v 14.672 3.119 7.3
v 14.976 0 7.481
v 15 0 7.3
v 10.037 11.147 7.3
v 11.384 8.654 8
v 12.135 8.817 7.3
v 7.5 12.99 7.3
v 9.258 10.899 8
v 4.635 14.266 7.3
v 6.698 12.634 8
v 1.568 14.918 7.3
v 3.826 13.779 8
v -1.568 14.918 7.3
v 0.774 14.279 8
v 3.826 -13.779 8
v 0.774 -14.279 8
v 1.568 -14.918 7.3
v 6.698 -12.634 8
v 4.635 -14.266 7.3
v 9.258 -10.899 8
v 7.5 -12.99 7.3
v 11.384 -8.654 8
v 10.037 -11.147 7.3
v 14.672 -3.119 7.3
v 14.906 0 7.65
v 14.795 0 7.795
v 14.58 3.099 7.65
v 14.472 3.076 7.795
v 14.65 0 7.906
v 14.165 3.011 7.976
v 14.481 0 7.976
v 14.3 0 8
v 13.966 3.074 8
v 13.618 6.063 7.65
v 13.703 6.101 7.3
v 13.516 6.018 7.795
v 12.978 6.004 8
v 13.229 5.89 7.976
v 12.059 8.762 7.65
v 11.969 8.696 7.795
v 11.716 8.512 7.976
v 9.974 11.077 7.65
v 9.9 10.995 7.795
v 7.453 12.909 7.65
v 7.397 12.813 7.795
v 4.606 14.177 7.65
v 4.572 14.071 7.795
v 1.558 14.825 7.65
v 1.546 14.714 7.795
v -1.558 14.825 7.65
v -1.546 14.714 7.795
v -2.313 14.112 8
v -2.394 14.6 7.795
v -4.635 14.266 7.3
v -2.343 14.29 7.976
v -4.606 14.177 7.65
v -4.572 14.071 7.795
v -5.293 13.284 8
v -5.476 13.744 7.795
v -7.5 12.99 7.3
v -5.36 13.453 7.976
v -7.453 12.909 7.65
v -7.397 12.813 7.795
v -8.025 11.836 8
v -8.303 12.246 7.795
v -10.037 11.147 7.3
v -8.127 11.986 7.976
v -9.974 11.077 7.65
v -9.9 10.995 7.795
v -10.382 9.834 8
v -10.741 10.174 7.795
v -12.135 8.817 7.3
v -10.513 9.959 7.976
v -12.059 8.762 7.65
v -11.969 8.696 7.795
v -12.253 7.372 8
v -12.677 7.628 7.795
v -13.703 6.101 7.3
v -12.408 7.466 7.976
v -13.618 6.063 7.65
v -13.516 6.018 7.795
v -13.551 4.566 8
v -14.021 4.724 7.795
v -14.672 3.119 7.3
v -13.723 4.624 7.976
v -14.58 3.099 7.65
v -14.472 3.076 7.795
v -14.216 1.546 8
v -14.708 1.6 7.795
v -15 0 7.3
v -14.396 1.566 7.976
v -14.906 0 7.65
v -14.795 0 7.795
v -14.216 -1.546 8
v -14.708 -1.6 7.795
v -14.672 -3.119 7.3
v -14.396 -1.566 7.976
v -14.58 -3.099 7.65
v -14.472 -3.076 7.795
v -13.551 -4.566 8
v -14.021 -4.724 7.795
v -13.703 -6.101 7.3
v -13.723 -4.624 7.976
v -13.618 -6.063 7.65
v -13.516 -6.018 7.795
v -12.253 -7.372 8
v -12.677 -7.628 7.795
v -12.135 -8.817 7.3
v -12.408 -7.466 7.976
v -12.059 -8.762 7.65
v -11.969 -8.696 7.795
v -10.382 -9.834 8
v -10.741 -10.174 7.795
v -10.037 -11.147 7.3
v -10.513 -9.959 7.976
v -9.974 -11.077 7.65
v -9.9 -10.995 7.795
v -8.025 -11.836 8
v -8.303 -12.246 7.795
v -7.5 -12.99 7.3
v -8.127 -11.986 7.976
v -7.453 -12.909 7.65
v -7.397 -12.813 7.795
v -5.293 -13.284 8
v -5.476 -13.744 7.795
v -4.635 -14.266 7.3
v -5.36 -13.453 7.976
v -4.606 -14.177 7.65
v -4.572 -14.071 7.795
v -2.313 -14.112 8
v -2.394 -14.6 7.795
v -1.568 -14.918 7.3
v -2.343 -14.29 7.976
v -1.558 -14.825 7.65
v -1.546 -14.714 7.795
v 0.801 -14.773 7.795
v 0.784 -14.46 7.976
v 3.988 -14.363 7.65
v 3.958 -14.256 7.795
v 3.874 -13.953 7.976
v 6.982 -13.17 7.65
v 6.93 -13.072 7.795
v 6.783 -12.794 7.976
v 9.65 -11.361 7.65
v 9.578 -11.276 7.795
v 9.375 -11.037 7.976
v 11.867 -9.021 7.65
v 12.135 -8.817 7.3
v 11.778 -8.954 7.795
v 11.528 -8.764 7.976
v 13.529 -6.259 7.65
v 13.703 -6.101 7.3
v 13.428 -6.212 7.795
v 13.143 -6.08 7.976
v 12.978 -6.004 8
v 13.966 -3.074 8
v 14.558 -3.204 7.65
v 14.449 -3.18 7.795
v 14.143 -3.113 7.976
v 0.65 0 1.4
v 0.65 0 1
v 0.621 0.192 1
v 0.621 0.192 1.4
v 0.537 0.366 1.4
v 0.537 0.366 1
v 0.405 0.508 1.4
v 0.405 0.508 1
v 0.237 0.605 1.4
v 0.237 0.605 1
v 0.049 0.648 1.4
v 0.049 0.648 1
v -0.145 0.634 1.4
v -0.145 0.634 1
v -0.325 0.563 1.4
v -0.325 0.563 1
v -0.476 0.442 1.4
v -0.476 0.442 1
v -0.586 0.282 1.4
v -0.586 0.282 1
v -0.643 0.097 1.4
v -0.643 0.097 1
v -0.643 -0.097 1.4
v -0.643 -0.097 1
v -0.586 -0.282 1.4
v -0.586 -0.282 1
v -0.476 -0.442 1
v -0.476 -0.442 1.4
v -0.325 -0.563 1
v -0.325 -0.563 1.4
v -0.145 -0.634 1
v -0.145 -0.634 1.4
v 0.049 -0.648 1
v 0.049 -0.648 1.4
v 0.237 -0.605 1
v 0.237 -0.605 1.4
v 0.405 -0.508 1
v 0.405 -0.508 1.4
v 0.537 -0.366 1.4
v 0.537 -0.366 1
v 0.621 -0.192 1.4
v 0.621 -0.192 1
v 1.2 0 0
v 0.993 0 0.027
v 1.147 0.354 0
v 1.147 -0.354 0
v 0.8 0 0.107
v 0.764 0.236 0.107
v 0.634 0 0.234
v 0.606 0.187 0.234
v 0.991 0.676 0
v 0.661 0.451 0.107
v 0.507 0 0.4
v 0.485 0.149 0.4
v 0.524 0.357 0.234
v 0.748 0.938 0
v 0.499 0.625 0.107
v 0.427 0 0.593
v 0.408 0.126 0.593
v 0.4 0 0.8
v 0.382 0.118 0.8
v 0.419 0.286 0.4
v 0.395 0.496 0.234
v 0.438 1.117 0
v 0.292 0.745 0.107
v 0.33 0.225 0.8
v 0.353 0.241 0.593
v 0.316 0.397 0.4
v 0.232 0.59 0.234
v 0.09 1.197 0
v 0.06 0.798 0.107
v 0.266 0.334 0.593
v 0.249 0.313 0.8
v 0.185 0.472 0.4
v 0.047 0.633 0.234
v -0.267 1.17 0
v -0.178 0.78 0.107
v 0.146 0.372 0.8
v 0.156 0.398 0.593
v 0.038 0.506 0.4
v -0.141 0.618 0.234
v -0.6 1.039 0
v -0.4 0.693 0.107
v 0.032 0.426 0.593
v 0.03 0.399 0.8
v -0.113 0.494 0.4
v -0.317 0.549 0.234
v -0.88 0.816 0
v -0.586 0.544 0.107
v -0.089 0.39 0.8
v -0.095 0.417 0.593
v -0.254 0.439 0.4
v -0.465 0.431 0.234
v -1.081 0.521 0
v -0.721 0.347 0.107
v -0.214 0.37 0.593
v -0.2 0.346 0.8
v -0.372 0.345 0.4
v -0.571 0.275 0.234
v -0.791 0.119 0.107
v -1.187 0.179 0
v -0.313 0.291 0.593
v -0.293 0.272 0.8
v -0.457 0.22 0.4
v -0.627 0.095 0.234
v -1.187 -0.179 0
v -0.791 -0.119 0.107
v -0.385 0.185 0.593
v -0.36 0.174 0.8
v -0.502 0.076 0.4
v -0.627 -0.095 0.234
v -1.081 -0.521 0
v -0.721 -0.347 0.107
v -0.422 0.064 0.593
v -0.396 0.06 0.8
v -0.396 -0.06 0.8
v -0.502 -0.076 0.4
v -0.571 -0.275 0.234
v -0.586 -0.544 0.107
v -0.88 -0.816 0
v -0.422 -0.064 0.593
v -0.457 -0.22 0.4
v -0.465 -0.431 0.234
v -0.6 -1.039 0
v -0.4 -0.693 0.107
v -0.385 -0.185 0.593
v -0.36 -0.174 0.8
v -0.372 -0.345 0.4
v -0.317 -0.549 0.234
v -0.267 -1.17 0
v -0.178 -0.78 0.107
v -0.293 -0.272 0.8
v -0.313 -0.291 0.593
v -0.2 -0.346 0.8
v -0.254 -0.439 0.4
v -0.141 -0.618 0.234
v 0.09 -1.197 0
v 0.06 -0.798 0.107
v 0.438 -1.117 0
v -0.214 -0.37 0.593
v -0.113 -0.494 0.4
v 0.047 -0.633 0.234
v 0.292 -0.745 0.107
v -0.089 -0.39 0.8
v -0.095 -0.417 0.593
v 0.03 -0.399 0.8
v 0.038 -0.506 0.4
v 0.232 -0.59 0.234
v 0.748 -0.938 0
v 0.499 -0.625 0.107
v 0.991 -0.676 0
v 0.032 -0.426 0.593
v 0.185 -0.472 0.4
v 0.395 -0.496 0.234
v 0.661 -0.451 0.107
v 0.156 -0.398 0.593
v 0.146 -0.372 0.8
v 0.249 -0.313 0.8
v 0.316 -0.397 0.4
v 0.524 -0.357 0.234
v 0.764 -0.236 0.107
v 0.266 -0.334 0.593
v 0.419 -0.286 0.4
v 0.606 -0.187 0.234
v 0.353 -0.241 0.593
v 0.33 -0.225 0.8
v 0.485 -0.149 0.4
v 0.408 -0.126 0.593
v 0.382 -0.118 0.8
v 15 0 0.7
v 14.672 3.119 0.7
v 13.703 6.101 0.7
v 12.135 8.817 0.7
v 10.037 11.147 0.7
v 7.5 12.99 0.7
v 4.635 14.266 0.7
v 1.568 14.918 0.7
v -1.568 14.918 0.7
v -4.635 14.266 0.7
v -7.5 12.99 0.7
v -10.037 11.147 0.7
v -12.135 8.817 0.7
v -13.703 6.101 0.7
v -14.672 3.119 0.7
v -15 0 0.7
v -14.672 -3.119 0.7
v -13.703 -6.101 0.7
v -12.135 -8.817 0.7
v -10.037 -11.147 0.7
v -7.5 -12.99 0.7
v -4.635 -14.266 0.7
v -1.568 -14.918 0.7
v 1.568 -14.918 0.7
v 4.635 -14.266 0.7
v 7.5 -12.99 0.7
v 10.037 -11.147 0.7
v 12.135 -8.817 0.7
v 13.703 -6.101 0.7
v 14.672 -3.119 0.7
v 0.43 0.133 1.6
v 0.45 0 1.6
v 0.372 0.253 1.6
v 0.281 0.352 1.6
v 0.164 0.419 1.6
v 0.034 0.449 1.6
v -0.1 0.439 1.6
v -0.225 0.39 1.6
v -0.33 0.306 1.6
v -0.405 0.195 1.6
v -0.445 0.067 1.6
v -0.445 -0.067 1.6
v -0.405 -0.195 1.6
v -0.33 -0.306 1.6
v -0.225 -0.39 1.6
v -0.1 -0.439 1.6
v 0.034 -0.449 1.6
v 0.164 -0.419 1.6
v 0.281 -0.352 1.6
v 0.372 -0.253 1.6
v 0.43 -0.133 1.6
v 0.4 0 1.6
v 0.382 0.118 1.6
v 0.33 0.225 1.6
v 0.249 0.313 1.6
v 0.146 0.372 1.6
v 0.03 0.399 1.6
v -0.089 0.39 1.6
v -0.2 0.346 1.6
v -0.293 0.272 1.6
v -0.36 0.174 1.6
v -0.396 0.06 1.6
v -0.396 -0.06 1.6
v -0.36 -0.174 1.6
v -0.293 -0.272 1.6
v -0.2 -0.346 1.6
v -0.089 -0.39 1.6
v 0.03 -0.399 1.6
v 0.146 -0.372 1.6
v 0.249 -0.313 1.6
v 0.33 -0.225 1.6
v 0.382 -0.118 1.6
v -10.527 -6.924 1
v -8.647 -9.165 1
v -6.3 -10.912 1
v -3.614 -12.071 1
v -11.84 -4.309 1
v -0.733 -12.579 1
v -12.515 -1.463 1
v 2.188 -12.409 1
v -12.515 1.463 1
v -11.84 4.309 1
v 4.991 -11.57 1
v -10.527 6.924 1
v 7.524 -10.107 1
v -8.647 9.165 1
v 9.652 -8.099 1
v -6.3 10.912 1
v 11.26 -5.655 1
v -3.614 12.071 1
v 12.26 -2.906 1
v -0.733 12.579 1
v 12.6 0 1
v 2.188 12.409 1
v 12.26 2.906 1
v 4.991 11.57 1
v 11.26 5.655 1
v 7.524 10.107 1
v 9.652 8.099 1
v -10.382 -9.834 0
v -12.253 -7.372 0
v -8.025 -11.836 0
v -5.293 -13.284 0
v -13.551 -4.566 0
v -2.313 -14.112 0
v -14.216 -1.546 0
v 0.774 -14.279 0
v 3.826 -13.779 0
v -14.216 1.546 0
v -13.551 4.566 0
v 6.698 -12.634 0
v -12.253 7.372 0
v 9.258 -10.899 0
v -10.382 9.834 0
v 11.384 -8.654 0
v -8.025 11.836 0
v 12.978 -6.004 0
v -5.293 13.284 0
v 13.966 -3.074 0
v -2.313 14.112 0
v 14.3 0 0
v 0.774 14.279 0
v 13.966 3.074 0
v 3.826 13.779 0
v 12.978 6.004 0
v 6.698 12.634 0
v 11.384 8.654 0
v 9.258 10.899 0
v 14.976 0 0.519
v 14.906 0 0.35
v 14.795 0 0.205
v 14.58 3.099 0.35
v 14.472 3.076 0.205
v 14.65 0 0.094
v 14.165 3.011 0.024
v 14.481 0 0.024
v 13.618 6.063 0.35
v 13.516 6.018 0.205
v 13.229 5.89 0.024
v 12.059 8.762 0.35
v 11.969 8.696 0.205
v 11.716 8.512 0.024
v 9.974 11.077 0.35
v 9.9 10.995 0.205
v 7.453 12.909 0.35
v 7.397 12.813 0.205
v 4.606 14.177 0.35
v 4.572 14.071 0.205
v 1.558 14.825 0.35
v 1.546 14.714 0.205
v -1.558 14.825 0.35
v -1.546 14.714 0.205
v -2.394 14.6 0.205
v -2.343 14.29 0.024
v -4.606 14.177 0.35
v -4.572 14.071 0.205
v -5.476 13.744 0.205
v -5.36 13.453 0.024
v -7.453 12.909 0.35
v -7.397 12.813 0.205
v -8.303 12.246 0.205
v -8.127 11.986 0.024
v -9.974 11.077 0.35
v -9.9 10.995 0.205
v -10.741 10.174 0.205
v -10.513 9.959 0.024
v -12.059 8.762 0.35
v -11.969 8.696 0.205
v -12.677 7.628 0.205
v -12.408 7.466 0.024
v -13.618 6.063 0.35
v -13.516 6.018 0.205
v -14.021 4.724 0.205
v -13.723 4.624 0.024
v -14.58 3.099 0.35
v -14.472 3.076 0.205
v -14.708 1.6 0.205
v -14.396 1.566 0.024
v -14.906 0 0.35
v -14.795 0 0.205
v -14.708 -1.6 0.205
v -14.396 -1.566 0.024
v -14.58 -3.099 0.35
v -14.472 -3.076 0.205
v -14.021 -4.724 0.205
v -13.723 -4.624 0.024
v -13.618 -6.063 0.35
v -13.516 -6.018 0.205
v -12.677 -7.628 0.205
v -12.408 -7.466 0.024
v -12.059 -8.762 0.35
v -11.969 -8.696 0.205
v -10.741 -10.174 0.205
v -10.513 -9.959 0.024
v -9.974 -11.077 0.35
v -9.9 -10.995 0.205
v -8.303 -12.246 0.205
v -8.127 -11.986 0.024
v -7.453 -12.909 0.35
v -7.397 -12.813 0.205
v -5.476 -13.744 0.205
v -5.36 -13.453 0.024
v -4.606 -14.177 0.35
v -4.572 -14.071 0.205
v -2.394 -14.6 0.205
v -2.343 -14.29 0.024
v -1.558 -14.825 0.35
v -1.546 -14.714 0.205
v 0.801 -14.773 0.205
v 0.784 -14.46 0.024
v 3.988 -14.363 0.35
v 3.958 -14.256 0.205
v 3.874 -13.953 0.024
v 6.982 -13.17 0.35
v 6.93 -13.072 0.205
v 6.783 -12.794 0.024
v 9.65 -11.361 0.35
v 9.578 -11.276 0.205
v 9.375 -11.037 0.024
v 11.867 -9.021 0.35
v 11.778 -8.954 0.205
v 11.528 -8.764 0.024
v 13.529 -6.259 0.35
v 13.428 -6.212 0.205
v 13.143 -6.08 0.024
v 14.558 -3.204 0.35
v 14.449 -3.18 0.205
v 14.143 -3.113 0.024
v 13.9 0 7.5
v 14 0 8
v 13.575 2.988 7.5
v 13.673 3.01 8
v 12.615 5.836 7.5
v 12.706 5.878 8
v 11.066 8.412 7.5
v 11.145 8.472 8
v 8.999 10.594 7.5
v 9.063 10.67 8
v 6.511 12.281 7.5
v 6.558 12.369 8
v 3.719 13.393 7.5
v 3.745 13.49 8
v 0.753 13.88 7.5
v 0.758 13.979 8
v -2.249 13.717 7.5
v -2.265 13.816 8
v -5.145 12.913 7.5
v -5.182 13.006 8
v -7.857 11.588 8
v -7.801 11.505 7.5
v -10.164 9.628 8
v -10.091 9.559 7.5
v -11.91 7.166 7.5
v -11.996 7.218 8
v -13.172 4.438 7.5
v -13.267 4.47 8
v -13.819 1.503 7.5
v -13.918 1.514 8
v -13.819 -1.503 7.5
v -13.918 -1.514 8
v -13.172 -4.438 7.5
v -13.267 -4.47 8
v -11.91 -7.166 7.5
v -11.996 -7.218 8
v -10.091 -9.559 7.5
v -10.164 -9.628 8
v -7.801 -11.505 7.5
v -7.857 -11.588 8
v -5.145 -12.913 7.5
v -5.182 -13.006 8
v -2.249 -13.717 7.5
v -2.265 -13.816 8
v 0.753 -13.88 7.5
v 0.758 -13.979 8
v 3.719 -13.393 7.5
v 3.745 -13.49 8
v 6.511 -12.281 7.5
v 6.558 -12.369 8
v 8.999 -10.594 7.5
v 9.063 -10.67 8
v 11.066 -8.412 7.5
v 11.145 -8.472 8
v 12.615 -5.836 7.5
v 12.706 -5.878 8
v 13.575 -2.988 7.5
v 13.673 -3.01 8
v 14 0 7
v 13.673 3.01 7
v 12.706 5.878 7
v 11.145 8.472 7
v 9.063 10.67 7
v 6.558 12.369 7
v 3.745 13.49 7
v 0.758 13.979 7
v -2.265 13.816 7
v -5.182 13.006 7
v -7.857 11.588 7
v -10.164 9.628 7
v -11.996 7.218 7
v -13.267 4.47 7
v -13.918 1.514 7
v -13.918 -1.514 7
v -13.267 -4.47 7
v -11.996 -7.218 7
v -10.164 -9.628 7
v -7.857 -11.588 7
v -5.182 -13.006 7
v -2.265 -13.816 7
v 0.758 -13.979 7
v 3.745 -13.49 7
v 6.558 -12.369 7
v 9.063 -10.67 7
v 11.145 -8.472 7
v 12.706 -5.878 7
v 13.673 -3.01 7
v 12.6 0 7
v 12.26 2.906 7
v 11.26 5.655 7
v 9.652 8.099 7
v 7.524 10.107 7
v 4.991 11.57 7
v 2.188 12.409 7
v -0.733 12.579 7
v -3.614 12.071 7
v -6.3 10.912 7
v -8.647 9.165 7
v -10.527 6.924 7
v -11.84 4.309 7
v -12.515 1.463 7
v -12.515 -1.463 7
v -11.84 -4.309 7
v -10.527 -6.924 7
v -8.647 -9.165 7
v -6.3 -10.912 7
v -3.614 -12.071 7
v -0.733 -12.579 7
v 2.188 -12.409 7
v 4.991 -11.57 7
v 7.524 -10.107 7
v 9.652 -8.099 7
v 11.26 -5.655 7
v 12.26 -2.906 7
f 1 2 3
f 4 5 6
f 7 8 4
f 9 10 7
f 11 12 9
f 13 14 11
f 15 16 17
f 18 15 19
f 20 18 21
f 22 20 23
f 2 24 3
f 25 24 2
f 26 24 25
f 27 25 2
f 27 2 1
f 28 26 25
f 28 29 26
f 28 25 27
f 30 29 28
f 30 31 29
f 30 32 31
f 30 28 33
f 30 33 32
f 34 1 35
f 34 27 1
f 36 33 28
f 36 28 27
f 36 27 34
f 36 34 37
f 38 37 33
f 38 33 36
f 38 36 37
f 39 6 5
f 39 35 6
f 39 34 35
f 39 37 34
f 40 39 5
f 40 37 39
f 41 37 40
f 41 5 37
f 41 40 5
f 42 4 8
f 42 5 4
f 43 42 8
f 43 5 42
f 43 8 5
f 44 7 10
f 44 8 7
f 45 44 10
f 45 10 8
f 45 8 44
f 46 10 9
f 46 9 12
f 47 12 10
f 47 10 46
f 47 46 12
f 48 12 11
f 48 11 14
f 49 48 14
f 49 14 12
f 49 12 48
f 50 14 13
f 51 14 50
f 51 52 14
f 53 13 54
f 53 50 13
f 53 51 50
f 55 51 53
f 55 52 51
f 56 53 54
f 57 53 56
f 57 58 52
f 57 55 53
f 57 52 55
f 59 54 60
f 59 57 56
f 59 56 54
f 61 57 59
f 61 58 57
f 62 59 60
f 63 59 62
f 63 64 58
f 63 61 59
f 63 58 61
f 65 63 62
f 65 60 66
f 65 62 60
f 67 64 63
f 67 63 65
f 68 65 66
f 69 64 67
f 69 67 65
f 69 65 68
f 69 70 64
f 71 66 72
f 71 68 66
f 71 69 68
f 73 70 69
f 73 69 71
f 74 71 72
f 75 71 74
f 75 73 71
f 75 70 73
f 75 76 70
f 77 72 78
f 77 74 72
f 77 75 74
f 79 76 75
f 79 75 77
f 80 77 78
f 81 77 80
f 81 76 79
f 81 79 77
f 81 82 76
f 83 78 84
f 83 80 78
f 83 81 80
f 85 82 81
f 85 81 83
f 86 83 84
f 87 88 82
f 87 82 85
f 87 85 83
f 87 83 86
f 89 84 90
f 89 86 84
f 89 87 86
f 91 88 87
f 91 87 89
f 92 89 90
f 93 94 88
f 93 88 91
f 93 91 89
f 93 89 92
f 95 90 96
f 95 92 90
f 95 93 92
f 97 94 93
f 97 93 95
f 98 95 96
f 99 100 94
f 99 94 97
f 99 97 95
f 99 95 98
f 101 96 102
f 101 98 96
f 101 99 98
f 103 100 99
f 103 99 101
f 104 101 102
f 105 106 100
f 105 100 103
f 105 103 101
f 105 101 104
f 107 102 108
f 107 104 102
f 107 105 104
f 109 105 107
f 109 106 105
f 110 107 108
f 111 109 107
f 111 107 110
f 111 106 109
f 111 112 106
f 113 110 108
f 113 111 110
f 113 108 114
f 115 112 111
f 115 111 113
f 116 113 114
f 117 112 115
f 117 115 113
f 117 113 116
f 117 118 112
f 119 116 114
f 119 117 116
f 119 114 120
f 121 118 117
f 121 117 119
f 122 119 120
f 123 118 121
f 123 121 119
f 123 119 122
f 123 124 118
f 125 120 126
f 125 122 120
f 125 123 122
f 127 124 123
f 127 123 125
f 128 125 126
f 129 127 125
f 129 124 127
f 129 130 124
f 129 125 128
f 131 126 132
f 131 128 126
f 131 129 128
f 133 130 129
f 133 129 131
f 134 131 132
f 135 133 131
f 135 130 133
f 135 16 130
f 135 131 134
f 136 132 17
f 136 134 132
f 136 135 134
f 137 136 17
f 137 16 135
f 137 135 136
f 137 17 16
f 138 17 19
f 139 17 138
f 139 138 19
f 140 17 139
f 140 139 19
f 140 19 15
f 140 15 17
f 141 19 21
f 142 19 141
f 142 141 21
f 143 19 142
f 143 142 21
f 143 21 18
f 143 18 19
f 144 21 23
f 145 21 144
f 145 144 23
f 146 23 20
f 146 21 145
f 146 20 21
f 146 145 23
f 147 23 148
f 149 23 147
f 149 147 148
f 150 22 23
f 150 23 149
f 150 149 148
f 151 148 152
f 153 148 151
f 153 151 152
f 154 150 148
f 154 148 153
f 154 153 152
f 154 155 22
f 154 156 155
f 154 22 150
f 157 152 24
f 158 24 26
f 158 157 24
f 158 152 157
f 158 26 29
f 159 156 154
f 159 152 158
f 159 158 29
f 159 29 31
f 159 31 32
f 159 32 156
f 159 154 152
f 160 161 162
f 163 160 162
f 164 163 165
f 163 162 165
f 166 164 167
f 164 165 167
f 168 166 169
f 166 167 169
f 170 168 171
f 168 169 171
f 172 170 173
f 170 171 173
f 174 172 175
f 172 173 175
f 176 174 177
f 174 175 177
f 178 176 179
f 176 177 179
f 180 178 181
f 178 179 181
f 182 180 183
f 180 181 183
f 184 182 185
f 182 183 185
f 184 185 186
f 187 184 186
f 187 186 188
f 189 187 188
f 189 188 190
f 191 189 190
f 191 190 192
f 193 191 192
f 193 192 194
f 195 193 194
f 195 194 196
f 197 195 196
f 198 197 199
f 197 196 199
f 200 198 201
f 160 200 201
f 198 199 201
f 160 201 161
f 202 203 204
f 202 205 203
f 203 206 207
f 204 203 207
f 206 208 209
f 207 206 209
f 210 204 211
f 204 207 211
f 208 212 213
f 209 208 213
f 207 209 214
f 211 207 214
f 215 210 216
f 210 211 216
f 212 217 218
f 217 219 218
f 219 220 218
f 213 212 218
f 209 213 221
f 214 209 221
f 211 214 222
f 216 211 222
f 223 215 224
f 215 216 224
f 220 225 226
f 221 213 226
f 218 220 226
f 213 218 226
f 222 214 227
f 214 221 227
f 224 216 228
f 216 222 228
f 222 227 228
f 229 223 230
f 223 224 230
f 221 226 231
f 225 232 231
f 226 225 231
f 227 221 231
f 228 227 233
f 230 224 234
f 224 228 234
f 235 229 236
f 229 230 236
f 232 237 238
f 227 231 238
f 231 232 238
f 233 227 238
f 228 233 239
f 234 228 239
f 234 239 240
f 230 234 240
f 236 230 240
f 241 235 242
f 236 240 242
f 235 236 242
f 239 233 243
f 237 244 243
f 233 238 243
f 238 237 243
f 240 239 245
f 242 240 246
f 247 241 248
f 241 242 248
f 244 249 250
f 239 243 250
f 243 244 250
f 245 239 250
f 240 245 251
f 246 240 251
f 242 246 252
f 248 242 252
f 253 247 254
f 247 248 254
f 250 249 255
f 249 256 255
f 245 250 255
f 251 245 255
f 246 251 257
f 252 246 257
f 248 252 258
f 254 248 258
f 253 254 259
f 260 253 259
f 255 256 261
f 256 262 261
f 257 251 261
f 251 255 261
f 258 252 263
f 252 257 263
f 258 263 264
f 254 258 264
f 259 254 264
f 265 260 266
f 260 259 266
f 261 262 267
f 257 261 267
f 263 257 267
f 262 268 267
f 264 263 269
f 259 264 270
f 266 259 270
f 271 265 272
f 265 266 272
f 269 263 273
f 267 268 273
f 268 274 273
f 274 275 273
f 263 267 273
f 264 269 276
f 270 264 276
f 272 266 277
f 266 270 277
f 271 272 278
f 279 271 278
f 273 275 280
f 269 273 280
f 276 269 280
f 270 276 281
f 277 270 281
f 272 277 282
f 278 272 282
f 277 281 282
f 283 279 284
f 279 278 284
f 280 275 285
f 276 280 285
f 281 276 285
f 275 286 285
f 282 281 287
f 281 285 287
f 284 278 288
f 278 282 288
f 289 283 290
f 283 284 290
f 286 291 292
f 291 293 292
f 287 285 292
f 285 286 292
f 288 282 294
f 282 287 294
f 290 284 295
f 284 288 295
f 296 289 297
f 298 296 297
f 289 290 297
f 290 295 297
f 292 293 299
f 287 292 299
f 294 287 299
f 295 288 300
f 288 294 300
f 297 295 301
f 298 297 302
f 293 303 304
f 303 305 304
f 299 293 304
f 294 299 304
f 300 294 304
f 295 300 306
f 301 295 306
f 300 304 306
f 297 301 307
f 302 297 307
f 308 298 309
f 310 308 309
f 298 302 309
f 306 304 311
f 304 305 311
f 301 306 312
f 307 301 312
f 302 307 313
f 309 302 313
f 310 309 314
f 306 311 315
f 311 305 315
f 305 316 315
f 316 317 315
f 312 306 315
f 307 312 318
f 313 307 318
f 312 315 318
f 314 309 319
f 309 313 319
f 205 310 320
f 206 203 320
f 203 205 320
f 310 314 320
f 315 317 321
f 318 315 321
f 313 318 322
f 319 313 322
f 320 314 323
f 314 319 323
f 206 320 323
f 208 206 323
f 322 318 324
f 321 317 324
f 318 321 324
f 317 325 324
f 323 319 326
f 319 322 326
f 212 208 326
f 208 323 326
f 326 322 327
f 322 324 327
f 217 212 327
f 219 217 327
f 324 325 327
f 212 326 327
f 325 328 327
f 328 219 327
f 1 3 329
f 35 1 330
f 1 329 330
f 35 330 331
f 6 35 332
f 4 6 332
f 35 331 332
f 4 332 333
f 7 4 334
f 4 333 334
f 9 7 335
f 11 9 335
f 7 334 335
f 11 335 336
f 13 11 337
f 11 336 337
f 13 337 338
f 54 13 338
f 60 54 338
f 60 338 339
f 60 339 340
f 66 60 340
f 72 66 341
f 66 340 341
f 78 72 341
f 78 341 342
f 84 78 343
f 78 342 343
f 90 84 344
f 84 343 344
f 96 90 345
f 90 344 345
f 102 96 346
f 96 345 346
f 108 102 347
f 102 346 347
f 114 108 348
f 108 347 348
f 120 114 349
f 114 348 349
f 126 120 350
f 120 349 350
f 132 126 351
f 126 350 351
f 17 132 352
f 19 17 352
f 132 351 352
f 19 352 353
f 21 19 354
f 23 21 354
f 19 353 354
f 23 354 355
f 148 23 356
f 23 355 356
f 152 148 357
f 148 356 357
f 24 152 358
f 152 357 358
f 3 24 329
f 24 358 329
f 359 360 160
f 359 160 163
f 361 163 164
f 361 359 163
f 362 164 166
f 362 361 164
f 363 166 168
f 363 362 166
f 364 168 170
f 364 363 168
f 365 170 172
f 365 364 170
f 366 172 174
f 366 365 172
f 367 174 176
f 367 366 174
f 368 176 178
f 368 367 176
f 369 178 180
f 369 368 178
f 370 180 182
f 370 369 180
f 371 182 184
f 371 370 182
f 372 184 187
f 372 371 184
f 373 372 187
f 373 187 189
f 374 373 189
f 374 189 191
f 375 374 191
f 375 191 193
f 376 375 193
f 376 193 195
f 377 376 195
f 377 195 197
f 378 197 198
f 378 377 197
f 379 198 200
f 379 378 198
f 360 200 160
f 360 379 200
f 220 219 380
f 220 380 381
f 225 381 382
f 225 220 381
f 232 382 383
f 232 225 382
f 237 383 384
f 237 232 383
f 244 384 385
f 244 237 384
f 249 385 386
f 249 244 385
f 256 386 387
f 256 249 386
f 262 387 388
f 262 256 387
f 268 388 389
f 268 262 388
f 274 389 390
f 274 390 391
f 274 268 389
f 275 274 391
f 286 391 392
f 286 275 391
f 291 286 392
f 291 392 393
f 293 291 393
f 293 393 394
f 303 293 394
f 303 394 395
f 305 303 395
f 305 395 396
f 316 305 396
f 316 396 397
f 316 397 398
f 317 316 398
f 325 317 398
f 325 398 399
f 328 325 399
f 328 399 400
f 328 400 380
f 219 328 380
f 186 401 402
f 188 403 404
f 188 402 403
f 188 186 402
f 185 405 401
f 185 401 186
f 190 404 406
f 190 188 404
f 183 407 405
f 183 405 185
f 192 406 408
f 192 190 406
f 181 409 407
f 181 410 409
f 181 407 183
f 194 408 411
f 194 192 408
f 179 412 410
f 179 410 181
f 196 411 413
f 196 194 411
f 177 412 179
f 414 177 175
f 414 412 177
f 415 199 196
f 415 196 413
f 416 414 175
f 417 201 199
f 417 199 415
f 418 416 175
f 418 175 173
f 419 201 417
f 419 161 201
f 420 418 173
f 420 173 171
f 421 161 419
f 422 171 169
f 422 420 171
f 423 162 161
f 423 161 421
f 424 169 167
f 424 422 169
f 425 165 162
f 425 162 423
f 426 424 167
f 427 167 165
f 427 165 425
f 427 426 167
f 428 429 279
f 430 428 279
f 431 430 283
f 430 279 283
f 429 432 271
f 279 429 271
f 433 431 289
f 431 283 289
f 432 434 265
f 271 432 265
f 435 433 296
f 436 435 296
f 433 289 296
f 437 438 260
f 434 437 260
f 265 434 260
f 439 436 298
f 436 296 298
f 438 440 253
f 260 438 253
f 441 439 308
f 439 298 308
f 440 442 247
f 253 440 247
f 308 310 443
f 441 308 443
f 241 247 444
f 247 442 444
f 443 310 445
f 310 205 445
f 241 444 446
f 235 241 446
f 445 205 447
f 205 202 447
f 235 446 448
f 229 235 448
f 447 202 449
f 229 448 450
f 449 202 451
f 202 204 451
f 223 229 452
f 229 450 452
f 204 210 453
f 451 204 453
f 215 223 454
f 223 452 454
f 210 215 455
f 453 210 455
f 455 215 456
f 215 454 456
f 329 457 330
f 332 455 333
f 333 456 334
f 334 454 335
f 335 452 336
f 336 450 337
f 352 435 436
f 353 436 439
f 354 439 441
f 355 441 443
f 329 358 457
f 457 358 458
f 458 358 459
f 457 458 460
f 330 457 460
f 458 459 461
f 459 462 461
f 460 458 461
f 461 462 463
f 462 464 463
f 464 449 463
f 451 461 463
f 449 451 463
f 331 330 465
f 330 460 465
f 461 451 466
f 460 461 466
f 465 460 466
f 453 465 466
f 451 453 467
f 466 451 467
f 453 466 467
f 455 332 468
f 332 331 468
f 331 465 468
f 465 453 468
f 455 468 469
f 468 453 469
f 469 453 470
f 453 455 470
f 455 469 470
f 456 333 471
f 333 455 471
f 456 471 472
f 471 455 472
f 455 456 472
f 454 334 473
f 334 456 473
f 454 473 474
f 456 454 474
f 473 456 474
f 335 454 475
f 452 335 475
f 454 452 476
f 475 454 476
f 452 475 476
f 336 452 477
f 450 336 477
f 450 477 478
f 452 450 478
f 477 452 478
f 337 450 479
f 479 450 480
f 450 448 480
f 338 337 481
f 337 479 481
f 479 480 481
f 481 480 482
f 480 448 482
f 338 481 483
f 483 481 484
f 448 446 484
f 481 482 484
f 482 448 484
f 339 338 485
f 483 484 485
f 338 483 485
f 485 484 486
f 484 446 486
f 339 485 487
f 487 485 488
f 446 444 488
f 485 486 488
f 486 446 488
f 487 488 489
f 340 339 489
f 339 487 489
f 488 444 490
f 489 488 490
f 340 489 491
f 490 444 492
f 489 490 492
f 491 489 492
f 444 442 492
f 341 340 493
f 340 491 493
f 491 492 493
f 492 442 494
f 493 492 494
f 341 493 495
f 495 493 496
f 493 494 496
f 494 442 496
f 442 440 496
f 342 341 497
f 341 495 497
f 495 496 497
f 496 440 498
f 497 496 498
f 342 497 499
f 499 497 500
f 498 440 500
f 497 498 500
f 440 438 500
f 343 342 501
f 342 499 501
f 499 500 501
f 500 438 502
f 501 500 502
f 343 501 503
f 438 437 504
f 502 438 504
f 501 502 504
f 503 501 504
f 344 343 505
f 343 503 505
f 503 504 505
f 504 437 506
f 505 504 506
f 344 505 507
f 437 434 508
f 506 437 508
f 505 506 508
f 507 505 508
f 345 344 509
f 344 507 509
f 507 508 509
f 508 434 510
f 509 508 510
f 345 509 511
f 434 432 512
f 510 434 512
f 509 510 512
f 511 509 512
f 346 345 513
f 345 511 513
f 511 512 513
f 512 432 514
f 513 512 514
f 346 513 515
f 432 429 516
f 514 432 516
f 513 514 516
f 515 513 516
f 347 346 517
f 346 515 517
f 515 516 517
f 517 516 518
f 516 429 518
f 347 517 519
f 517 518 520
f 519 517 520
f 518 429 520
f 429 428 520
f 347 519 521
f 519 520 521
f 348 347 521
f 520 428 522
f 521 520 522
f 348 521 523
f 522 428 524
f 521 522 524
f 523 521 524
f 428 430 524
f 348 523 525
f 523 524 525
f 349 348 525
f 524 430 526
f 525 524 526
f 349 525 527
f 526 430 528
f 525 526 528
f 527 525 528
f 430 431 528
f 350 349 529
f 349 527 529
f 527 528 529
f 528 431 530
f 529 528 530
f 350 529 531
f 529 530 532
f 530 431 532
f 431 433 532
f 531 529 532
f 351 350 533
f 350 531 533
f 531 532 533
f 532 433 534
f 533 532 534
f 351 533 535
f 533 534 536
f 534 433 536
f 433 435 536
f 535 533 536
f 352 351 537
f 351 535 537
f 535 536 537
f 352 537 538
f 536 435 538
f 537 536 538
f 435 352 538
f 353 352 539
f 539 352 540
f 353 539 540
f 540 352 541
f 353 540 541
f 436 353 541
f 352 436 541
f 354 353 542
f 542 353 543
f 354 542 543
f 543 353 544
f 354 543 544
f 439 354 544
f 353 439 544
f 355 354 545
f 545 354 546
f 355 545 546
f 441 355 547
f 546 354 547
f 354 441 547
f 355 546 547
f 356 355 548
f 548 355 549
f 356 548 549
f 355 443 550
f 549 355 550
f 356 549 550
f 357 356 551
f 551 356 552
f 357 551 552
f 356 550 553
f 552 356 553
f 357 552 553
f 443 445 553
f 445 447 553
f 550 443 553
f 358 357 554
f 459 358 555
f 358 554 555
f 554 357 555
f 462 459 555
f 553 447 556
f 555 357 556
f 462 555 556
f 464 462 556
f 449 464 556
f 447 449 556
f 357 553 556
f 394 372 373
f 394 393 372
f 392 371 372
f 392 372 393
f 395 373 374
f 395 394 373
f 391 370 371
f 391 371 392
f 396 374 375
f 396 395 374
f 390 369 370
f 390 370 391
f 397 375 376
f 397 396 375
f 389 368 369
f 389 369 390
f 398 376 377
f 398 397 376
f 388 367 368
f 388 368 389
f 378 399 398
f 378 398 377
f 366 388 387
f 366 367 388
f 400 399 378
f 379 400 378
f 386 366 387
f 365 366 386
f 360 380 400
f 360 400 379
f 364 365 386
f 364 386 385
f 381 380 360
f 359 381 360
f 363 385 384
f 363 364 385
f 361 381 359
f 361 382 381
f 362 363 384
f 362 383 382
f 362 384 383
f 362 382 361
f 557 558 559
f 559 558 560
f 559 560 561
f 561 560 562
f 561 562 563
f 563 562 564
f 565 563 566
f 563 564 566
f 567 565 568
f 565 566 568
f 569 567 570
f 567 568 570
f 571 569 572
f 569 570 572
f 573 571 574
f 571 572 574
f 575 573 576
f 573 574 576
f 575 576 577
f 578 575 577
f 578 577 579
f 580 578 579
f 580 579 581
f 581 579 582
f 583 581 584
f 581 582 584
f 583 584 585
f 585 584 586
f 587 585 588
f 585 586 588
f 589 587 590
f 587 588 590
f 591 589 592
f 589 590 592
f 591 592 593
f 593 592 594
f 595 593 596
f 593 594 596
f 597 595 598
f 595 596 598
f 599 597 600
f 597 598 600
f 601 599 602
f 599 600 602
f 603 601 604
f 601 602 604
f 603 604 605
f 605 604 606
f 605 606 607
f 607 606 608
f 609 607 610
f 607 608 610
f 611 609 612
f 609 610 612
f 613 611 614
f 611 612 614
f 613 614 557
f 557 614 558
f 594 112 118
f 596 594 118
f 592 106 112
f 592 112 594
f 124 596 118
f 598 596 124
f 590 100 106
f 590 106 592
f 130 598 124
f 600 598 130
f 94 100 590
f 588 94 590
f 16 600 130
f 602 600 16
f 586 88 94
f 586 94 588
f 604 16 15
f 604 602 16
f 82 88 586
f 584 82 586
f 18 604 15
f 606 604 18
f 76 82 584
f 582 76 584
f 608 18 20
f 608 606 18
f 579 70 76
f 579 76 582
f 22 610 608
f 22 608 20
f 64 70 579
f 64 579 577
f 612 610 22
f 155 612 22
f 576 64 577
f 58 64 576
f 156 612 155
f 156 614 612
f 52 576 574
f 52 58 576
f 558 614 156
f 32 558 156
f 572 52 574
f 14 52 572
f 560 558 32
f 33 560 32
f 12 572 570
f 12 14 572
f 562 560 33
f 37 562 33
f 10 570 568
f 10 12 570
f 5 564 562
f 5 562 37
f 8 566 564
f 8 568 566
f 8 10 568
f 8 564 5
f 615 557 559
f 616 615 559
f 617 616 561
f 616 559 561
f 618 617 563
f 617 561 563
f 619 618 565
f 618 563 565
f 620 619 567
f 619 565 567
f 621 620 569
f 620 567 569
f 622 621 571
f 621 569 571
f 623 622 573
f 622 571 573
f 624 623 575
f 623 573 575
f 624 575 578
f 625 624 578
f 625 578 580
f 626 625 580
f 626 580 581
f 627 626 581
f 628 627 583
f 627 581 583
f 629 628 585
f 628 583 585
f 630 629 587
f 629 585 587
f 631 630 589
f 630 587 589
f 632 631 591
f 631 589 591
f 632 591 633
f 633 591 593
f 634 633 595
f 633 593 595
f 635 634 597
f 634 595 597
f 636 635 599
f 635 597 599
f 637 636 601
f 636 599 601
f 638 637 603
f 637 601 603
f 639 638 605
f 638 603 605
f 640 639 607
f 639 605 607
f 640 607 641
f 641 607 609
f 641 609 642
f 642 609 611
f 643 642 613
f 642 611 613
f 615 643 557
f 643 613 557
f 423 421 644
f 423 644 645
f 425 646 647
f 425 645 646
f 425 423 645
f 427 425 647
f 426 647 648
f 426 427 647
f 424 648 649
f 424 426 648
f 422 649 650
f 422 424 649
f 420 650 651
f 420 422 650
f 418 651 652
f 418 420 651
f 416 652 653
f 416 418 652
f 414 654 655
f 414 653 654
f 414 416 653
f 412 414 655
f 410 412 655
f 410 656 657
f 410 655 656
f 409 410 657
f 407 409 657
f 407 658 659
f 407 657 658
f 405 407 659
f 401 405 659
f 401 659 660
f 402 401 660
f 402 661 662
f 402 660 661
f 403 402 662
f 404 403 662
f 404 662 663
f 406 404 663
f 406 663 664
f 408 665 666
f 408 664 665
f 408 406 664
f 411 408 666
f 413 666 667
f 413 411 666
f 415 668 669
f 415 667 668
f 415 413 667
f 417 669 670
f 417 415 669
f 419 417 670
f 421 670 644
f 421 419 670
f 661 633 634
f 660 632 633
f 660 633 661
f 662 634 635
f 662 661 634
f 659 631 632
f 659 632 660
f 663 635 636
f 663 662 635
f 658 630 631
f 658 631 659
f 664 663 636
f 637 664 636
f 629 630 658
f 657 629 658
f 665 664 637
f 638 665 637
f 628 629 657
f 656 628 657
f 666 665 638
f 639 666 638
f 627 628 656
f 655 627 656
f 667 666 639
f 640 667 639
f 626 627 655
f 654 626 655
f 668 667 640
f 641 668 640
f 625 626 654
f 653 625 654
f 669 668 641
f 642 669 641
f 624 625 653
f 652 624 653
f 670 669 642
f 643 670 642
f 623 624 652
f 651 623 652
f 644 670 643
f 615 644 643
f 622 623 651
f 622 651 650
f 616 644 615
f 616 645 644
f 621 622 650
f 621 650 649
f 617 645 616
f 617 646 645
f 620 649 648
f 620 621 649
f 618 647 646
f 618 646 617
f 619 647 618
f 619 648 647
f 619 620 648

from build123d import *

# Parameters (mm, degrees)
CYLINDER007_R     = 14
CYLINDER007_DEPTH = 1
CYLINDER006_R     = 14
CYLINDER006_DEPTH = 1
CYLINDER005_R     = 0.4
CYLINDER005_DEPTH = 1
CYLINDER001_R     = 12.6
CYLINDER001_DEPTH = 8
CYLINDER_R        = 15
CYLINDER_DEPTH    = 8
CYLINDER002_R     = 15
CYLINDER002_DEPTH = 1
FILLET_R          = 0.7
FILLET001_R       = 0.7
FILLET002_R       = 0.8
CYLINDER004_R     = 0.4
CYLINDER004_DEPTH = 0.6
CYLINDER003_R     = 0.65
CYLINDER003_DEPTH = 0.6
CHAMFER_SIZE      = 0.2


with BuildPart() as cone001:
    # Cone001 → Cone001 (revolve)
    with BuildSketch(Plane(origin=(0, 0, 7), x_dir=(1, 0, 0), z_dir=(0, -1, 0))):
        Polygon((0, 0), (13.8, 0), (14, 1), (0, 1), align=None)
    revolve(axis=Axis((0, 0, 7), (0, 0, 1)))


with BuildPart() as cone:
    # Cone → Cone (revolve)
    with BuildSketch(Plane(origin=(0, 0, 7), x_dir=(1, 0, 0), z_dir=(0, -1, 0))):
        Polygon((0, 0), (14, 0), (13.8, 1), (0, 1), align=None)
    revolve(axis=Axis((0, 0, 7), (0, 0, 1)))


with BuildPart() as cut005:
    # Cylinder007 → Cylinder007 (new body)
    with BuildSketch(Plane.XY.offset(7)):
        Circle(CYLINDER007_R)
    extrude(amount=CYLINDER007_DEPTH)

    # Cut004: cut Cone
    add(cone.part, mode=Mode.SUBTRACT)

    # Cut005: cut Cone001
    add(cone001.part, mode=Mode.SUBTRACT)


with BuildPart() as cylinder006:
    # Cylinder006 → Cylinder006 (new body)
    with BuildSketch(Plane.XY.offset(7)):
        Circle(CYLINDER006_R)
    extrude(amount=CYLINDER006_DEPTH)


with BuildPart() as cylinder005:
    # Cylinder005 → Cylinder005 (new body)
    with BuildSketch(Plane.XY):
        Circle(CYLINDER005_R)
    extrude(amount=CYLINDER005_DEPTH)


with BuildPart() as cylinder001:
    # Cylinder001 → Cylinder001 (new body)
    with BuildSketch(Plane.XY):
        Circle(CYLINDER001_R)
    extrude(amount=CYLINDER001_DEPTH)


with BuildPart() as cut:
    # Cylinder → Cylinder (new body)
    with BuildSketch(Plane.XY):
        Circle(CYLINDER_R)
    extrude(amount=CYLINDER_DEPTH)

    # Cut: cut Cylinder001
    add(cylinder001.part, mode=Mode.SUBTRACT)


with BuildPart() as fillet002:
    # Cylinder002 → Cylinder002 (new body)
    with BuildSketch(Plane.XY):
        Circle(CYLINDER002_R)
    extrude(amount=CYLINDER002_DEPTH)

    # Fusion: union Cut
    add(cut.part)

    # Cut001: cut Cylinder005
    add(cylinder005.part, mode=Mode.SUBTRACT)

    # Cut003: cut Cylinder006
    add(cylinder006.part, mode=Mode.SUBTRACT)

    # Fillet
    fillet_edges = [fillet002.edges().sort_by_distance(p)[0] for p in [
        (-15, 0, 8),
    ]]
    fillet(fillet_edges, radius=FILLET_R)

    # Fillet001
    fillet001_edges = [fillet002.edges().sort_by_distance(p)[0] for p in [
        (-15, 0, 0),
    ]]
    fillet(fillet001_edges, radius=FILLET001_R)

    # Fillet002
    fillet002_edges = [fillet002.edges().sort_by_distance(p)[0] for p in [
        (-0.4, 0, 0),
    ]]
    fillet(fillet002_edges, radius=FILLET002_R)


with BuildPart() as cylinder004:
    # Cylinder004 → Cylinder004 (new body)
    with BuildSketch(Plane.XY.offset(1)):
        Circle(CYLINDER004_R)
    extrude(amount=CYLINDER004_DEPTH)


with BuildPart() as fusion001:
    # Cylinder003 → Cylinder003 (new body)
    with BuildSketch(Plane.XY.offset(1)):
        Circle(CYLINDER003_R)
    extrude(amount=CYLINDER003_DEPTH)

    # Cut002: cut Cylinder004
    add(cylinder004.part, mode=Mode.SUBTRACT)

    # Chamfer
    chamfer_edges = [fusion001.edges().sort_by_distance(p)[0] for p in [
        (-0.65, 0, 1.6),
    ]]
    chamfer(chamfer_edges, length=CHAMFER_SIZE)

    # Fusion001: union Cut005, Fillet002
    add(cut005.part)
    add(fillet002.part)


solid = fusion001.part
